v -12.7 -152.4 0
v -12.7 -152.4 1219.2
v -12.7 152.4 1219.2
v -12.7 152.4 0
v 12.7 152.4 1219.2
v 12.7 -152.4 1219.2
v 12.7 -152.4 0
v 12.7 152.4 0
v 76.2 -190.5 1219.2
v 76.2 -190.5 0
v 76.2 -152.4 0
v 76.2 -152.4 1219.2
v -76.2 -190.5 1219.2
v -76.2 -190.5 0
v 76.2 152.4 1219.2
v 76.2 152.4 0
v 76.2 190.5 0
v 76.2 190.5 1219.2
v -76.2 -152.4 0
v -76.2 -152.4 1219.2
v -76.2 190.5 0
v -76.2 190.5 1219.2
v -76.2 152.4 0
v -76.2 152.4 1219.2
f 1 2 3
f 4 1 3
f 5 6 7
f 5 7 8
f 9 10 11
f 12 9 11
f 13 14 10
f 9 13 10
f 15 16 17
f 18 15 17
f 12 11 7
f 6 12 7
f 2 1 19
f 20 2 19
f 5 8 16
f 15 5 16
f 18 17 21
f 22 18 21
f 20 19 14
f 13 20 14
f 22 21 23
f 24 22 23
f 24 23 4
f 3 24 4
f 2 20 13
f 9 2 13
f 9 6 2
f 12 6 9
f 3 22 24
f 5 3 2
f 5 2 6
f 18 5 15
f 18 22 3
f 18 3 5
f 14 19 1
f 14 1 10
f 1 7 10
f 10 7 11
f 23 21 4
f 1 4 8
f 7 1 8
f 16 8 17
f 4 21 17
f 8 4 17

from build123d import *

# Parameters (mm, degrees)
SKETCH2_W           = 25.4
SKETCH2_H           = 304.8
BOSS_EXTRUDE1_DEPTH = 1219.2


with BuildPart() as part:
    # Sketch2 → Boss-Extrude1 (new body)
    with BuildSketch(Plane.XY):
        Polygon((-76.2, 152.4), (-12.7, 152.4), (12.7, 152.4), (76.2, 152.4), (76.2, 190.5), (-76.2, 190.5), align=None)
        Rectangle(SKETCH2_W, SKETCH2_H)
        Polygon((12.7, -152.4), (-12.7, -152.4), (-76.2, -152.4), (-76.2, -190.5), (76.2, -190.5), (76.2, -152.4), align=None)
    extrude(amount=BOSS_EXTRUDE1_DEPTH)


solid = part.part
